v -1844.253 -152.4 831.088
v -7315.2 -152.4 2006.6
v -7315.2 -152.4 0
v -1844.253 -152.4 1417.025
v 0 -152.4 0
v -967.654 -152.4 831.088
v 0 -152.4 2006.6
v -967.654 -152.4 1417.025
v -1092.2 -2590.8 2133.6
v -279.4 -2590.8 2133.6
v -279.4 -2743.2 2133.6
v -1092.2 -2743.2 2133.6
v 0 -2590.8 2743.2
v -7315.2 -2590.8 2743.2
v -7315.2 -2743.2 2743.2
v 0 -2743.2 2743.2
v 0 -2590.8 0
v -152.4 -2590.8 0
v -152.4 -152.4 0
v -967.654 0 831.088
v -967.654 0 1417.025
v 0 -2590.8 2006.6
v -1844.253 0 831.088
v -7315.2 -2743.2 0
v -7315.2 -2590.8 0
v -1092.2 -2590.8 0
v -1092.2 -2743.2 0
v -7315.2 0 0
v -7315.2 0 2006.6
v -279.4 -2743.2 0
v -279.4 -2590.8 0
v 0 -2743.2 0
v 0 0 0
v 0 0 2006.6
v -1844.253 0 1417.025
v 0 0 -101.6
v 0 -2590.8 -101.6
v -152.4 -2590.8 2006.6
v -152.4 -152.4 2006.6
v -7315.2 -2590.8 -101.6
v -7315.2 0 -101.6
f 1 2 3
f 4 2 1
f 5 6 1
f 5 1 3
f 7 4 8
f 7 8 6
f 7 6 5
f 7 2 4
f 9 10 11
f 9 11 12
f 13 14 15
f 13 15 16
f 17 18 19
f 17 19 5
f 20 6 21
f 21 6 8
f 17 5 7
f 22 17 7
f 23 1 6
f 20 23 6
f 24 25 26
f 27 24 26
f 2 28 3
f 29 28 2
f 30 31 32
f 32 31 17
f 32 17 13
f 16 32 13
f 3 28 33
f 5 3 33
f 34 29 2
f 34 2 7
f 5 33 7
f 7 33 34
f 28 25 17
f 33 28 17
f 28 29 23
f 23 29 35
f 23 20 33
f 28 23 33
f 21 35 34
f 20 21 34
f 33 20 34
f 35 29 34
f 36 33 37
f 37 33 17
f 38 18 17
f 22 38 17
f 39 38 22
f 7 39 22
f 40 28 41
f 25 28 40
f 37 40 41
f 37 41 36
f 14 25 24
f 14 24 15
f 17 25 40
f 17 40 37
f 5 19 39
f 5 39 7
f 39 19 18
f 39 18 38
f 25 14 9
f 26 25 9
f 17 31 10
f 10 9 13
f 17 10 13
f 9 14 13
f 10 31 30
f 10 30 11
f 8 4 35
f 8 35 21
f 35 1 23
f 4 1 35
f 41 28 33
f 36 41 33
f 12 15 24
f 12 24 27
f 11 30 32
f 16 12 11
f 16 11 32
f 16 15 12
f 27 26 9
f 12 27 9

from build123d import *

# Parameters (mm, degrees)
F0_W      = 7315.2
F0_H      = 2006.6
F1_DEPTH  = 152.4
F2_W      = 876.598181
F2_H      = 585.937315
F3_DEPTH  = 152.401
F4_W      = 152.4
F4_H      = 2006.6
F5_DEPTH  = 2438.4
F6_W      = 7315.2
F6_H      = 2590.8
F7_DEPTH  = 101.6
F8_W      = 7315.2
F8_H      = 2743.2
F9_DEPTH  = 152.4
F10_W     = 812.8
F10_H     = 2133.6
F11_DEPTH = 152.401


with BuildPart() as f1:
    # F0 (on Front) → F1 (new body)
    with BuildSketch(Plane.XZ):
        with Locations((-3657.6, 1003.3)):
            Rectangle(F0_W, F0_H)
    extrude(amount=F1_DEPTH)

    # F2 (on face) → F3 (cut, through all)
    with BuildSketch(Plane.XZ.offset(152.4)):
        with Locations((-1405.953557, 1124.056657)):
            Rectangle(F2_W, F2_H)
    extrude(amount=-F3_DEPTH, mode=Mode.SUBTRACT)


with BuildPart() as f5:
    # F4 (on face) → F5 (new body)
    with BuildSketch(Plane.XZ.offset(152.4)):
        with Locations((-76.2, 1003.3)):
            Rectangle(F4_W, F4_H)
    extrude(amount=F5_DEPTH)


with BuildPart() as f7:
    # F6 (on face) → F7 (new body)
    with BuildSketch(Plane(origin=(0, 0, 0), x_dir=(1, 0, 0), z_dir=(0, 0, -1))):
        with Locations((-3657.6, 1295.4)):
            Rectangle(F6_W, F6_H)
    extrude(amount=F7_DEPTH)


with BuildPart() as f9:
    # F8 (on face) → F9 (new body)
    with BuildSketch(Plane.XZ.offset(2590.8)):
        with Locations((-3657.6, 1371.6)):
            Rectangle(F8_W, F8_H)
    extrude(amount=F9_DEPTH)

    # F10 (on face) → F11 (cut, through all)
    with BuildSketch(Plane(origin=(0, -2590.8, 0), x_dir=(-1, 0, 0), z_dir=(0, 1, 0))):
        with Locations((685.8, 1066.8)):
            Rectangle(F10_W, F10_H)
    extrude(amount=-F11_DEPTH, mode=Mode.SUBTRACT)


solid = Compound([f1.part, f5.part, f7.part, f9.part])
